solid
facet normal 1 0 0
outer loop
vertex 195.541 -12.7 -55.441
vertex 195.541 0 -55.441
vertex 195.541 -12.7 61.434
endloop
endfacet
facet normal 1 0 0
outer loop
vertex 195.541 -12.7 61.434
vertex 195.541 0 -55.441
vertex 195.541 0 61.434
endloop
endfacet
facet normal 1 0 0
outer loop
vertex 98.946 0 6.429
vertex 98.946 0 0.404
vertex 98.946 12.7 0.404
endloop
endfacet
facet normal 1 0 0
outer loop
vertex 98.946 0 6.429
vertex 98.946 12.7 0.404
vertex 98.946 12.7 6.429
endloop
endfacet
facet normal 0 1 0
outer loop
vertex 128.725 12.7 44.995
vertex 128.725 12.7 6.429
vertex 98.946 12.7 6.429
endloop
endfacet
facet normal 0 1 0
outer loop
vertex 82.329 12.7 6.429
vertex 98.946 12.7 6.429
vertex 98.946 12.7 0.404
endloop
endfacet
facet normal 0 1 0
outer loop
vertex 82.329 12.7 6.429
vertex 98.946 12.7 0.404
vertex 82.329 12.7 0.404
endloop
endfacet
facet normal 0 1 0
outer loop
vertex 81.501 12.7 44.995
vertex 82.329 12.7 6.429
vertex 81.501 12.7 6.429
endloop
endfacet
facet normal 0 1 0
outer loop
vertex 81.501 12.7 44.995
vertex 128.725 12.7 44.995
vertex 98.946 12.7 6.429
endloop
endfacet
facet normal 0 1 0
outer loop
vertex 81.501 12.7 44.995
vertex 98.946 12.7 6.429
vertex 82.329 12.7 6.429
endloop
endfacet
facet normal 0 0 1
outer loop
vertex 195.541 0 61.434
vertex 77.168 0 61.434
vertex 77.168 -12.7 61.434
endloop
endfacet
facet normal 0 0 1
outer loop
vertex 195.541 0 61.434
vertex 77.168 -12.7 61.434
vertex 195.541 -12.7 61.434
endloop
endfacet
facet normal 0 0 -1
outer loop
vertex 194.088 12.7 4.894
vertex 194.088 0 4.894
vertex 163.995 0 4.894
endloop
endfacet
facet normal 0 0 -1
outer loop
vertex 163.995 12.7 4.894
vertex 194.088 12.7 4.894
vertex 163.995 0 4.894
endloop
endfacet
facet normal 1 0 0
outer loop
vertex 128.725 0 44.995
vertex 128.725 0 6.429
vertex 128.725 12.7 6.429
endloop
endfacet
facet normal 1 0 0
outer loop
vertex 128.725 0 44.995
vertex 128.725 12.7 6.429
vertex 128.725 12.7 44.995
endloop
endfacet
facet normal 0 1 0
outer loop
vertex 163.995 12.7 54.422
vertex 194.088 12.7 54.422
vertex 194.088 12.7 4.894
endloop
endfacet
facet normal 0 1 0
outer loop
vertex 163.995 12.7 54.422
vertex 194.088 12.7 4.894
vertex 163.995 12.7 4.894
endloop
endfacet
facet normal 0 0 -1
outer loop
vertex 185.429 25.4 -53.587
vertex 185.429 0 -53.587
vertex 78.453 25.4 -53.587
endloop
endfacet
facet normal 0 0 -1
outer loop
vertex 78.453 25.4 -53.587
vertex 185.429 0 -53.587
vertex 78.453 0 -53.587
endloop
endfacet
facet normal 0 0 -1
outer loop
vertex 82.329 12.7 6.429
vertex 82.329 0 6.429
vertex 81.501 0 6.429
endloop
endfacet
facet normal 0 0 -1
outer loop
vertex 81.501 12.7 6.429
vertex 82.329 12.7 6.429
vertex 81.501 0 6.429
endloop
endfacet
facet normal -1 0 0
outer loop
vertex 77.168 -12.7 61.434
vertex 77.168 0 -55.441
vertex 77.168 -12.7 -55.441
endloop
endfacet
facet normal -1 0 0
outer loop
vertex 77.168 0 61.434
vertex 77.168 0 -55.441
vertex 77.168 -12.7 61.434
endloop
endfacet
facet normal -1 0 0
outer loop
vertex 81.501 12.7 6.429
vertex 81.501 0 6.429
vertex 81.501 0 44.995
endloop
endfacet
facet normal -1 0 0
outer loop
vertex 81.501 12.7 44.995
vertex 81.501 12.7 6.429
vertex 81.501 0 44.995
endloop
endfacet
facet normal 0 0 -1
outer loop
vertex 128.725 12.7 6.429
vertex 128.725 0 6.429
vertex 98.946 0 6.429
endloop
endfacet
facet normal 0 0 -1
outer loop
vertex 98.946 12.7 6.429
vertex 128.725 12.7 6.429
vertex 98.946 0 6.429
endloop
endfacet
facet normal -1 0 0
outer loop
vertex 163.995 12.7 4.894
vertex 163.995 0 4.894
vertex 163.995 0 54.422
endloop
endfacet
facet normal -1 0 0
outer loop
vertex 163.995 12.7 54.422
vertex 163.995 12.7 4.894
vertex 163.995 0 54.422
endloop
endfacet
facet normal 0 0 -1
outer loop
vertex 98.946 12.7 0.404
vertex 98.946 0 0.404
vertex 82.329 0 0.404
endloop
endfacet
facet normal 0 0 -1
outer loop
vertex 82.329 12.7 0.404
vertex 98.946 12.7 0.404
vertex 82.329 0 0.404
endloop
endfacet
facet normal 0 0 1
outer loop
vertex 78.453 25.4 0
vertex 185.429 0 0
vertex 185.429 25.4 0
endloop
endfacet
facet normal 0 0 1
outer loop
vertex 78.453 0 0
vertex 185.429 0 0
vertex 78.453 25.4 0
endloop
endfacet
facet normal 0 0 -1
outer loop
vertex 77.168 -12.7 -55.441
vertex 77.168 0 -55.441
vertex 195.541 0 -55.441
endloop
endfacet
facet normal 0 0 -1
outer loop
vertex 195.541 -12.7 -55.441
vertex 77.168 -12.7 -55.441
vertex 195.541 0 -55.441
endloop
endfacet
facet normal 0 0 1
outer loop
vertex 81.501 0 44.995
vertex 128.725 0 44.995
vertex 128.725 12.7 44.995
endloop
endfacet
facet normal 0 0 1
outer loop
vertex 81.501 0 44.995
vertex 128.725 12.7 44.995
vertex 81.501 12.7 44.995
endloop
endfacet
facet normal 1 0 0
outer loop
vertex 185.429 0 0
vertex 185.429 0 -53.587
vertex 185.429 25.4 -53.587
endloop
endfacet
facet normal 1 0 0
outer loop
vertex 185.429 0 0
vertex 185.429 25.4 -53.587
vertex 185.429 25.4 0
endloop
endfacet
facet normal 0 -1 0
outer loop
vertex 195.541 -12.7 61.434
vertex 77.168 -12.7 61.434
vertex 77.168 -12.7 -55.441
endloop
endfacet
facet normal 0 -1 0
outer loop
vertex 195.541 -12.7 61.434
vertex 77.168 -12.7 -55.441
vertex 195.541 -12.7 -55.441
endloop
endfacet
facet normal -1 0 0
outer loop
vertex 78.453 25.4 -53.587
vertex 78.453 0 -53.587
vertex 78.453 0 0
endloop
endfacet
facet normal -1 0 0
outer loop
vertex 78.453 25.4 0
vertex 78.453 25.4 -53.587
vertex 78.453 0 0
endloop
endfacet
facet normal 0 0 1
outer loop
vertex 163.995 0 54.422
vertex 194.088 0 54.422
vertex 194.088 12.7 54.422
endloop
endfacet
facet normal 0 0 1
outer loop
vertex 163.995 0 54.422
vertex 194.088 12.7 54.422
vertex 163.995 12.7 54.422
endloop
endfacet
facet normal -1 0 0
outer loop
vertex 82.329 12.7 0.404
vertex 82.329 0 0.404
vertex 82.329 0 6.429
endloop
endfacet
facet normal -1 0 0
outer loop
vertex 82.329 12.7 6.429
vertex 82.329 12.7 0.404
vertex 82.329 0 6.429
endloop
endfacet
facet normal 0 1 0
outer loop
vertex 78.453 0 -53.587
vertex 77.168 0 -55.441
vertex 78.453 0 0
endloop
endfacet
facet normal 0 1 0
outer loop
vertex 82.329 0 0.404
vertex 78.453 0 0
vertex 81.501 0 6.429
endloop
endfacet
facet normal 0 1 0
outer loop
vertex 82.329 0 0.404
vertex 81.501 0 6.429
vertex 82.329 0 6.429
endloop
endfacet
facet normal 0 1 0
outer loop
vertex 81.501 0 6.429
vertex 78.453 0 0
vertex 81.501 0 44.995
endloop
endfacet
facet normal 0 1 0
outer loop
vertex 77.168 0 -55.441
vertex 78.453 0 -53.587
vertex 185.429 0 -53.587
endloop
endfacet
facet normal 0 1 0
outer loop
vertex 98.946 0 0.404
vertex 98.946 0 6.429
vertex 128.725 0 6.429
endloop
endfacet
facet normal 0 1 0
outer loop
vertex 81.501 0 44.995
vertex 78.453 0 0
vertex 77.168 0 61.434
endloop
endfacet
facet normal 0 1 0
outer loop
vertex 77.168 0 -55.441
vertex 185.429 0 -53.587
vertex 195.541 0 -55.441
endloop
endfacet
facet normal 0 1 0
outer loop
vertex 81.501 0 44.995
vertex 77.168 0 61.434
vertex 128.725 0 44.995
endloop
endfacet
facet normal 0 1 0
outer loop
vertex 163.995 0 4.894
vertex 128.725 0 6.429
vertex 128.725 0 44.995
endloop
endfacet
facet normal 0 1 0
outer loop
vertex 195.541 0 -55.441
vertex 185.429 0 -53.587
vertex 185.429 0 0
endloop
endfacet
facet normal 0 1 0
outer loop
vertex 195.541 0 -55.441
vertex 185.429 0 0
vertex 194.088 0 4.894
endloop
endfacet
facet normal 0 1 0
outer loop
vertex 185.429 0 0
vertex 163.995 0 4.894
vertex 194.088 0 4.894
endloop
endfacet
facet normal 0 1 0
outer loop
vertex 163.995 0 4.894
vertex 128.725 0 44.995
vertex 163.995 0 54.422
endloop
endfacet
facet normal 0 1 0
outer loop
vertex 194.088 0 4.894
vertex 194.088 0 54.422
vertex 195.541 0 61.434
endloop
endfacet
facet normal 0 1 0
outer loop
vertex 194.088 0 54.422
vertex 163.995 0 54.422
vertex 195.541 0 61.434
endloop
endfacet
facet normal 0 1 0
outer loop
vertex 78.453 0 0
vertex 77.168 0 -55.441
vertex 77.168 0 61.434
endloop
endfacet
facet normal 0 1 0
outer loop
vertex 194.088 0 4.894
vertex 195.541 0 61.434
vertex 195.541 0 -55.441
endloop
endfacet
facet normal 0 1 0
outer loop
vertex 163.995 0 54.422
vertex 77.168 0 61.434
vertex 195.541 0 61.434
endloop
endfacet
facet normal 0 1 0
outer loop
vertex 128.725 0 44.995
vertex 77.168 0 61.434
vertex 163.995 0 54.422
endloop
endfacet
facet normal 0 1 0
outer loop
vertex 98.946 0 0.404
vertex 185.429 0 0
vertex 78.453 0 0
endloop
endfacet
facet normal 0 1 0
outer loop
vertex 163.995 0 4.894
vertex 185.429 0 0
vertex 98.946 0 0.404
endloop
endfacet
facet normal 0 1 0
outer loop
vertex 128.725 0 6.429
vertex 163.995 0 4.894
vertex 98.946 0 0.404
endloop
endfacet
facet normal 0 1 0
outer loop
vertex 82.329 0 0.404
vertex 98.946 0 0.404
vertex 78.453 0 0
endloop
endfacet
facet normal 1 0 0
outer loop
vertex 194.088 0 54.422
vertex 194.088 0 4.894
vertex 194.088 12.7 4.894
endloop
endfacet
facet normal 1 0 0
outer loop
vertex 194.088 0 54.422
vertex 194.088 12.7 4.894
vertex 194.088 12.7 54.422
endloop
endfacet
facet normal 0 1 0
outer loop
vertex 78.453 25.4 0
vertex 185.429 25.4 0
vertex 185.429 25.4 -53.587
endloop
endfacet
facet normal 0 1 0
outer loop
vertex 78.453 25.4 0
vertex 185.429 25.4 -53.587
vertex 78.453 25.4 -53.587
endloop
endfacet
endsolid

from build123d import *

# Parameters (mm, degrees)
F0_W     = 118.373677
F0_H     = 116.875283
F1_DEPTH = 12.7
F2_W     = 106.976003
F2_H     = 53.587355
F3_DEPTH = 25.4
F4_W     = 30.09352
F4_H     = 49.528088
F4_W_2   = 47.223489
F4_H_2   = 38.565222
F5_DEPTH = 12.7
F6_W     = 16.616419
F6_H     = 41.588474
F7_DEPTH = 12.7


with BuildPart() as f1:
    # F0 (on Front) → F1 (new body)
    with BuildSketch(Plane.XZ):
        with Locations((136.354491, 2.996803)):
            Rectangle(F0_W, F0_H)
    extrude(amount=F1_DEPTH)

    # F2 (on face) → F3 (join)
    with BuildSketch(Plane(origin=(0, 0, 0), x_dir=(-1, 0, 0), z_dir=(0, 1, 0))):
        with Locations((-131.941452, -26.793677)):
            Rectangle(F2_W, F2_H)
    extrude(amount=F3_DEPTH)

    # F4 (on face) → F5 (join)
    with BuildSketch(Plane(origin=(0, 0, 0), x_dir=(-1, 0, 0), z_dir=(0, 1, 0))):
        with Locations((-179.041378, 29.658426)):
            Rectangle(F4_W, F4_H)
        with Locations((-105.113152, 25.712056)):
            Rectangle(F4_W_2, F4_H_2)
    extrude(amount=F5_DEPTH)

    # F6 (on face) → F7 (join)
    with BuildSketch(Plane(origin=(0, 0, 0), x_dir=(-1, 0, 0), z_dir=(0, 1, 0))):
        with Locations((-90.637371, 21.197991)):
            Rectangle(F6_W, F6_H)
    extrude(amount=F7_DEPTH)


solid = f1.part
